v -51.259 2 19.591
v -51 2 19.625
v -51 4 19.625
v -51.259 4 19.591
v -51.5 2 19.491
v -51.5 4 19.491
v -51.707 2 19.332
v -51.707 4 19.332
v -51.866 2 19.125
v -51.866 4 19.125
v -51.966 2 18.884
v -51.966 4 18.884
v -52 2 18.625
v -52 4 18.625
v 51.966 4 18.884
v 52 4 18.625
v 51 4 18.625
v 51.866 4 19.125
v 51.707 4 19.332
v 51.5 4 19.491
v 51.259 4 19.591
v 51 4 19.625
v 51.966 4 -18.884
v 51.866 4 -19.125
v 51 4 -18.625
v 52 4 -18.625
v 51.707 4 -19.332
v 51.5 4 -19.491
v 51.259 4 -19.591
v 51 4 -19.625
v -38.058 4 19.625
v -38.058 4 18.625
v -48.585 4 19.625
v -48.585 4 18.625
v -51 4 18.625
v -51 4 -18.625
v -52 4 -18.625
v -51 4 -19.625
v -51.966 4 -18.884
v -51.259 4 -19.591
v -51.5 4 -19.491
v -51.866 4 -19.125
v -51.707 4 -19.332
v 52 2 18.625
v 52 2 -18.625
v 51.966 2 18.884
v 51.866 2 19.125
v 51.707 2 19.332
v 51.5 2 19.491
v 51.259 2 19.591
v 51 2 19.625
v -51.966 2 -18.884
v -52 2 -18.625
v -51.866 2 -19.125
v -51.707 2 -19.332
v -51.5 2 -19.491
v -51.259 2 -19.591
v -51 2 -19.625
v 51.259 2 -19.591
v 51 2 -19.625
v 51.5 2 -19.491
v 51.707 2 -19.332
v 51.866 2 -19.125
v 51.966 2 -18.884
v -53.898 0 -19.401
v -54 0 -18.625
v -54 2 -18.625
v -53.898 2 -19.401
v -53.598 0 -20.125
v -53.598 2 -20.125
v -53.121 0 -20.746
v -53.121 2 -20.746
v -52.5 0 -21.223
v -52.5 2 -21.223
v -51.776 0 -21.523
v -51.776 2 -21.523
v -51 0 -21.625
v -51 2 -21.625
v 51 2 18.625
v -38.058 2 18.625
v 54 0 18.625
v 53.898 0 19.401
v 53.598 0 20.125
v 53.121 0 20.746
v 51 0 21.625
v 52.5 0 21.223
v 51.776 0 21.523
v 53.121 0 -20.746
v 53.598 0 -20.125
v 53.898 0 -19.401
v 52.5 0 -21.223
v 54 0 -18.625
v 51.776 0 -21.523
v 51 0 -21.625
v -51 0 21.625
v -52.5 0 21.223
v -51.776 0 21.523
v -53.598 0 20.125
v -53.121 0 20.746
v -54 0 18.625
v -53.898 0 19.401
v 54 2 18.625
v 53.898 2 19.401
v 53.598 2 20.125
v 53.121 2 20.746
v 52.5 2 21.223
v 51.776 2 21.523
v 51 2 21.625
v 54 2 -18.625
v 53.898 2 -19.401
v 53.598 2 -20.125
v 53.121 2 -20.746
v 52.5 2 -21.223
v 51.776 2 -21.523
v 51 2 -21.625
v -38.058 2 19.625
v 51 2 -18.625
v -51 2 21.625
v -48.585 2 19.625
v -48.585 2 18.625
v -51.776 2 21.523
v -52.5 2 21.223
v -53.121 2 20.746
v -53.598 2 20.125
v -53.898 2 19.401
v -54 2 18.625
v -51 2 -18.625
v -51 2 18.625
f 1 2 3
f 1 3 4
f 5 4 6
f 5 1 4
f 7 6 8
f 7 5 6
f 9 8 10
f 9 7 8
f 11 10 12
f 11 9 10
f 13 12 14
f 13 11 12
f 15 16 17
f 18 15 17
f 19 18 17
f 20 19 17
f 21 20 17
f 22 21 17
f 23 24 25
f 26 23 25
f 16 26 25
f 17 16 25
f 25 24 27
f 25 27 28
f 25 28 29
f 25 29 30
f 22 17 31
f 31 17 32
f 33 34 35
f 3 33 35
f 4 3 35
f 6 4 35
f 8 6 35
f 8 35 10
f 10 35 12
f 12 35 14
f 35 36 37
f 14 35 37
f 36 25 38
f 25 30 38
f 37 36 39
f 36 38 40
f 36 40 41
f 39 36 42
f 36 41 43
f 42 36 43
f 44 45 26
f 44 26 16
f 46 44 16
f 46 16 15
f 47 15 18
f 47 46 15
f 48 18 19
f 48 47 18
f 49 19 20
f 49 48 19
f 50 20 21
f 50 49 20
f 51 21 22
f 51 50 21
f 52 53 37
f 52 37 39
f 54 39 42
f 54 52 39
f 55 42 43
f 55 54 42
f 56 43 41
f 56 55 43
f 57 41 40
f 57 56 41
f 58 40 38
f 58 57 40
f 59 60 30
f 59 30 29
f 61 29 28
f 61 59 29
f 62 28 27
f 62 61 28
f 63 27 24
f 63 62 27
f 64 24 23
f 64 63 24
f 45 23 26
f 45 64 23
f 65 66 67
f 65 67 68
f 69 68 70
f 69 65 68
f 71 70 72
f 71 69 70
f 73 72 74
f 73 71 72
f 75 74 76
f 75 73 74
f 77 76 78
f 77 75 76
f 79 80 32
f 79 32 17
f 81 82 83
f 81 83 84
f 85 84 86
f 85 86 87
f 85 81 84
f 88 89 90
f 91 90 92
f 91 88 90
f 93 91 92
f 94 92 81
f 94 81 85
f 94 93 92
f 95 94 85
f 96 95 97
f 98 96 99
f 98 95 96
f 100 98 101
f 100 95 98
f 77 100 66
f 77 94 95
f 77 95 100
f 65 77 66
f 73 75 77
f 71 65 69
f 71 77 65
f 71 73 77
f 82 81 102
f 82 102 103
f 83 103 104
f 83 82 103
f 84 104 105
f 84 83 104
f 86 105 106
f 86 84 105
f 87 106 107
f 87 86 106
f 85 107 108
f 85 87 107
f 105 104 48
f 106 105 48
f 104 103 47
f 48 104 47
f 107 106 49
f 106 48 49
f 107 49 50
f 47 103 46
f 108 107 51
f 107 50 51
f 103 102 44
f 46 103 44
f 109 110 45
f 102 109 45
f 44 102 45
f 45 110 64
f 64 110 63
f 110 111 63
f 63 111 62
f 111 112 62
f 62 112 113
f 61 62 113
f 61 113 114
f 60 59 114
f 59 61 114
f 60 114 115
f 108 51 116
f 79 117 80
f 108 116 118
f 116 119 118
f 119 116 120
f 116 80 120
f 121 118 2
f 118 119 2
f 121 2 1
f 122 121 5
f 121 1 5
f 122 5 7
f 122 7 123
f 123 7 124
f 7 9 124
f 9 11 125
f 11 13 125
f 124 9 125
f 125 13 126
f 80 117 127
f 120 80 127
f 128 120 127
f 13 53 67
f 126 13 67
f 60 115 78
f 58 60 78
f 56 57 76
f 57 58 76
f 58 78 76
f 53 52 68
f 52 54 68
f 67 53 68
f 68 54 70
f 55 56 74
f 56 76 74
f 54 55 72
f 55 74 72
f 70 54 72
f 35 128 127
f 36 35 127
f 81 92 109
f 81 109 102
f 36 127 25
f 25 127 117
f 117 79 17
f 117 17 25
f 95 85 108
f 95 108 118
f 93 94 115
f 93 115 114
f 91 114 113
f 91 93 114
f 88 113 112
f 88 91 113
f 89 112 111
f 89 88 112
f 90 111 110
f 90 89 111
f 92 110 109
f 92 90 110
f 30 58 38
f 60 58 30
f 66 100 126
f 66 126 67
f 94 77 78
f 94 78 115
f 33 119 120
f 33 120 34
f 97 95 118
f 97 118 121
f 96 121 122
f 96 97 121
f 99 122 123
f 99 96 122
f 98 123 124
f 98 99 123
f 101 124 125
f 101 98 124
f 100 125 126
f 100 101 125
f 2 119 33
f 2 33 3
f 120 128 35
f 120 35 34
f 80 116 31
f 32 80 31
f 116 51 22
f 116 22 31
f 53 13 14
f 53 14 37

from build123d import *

# Parameters (mm, degrees)
BOSS_EXTRUDE1_DEPTH = 2
SKETCH2_W           = 102
SKETCH2_H           = 37.25
BOSS_EXTRUDE2_DEPTH = 2
SKETCH3_W           = 10.5265
SKETCH3_H           = 3.907167626
CUT_EXTRUDE1_DEPTH  = 2


with BuildPart() as part:
    # Sketch1 → Boss-Extrude1 (new body)
    with BuildSketch(Plane(origin=(0, 0, 0), x_dir=(1, 0, 0), z_dir=(0, 1, 0))):
        with BuildLine():
            Line((51, -21.625), (-51, -21.625))
            ThreePointArc((-51, -21.625), (-53.121320344, -20.746320344), (-54, -18.625))
            Line((-54, -18.625), (-54, 18.625))
            ThreePointArc((-54, 18.625), (-53.121320344, 20.746320344), (-51, 21.625))
            Line((-51, 21.625), (51, 21.625))
            ThreePointArc((51, 21.625), (53.121320344, 20.746320344), (54, 18.625))
            Line((54, 18.625), (54, -18.625))
            ThreePointArc((54, -18.625), (53.121320344, -20.746320344), (51, -21.625))
        make_face()
    extrude(amount=BOSS_EXTRUDE1_DEPTH)

    # Sketch2 → Boss-Extrude2 (add)
    with BuildSketch(Plane(origin=(0, 2, 0), x_dir=(1, 0, 0), z_dir=(0, 1, 0))):
        with BuildLine():
            Line((51, -19.625), (-51, -19.625))
            ThreePointArc((-51, -19.625), (-51.707106781, -19.332106781), (-52, -18.625))
            Line((-52, -18.625), (-52, 18.625))
            ThreePointArc((-52, 18.625), (-51.707106781, 19.332106781), (-51, 19.625))
            Line((-51, 19.625), (51, 19.625))
            ThreePointArc((51, 19.625), (51.707106781, 19.332106781), (52, 18.625))
            Line((52, 18.625), (52, -18.625))
            ThreePointArc((52, -18.625), (51.707106781, -19.332106781), (51, -19.625))
        make_face()
        Rectangle(SKETCH2_W, SKETCH2_H, mode=Mode.SUBTRACT)
    extrude(amount=BOSS_EXTRUDE2_DEPTH)

    # Sketch3 → Cut-Extrude1 (cut)
    with BuildSketch(Plane.XY.offset(19.625)):
        with Locations((-43.32145, 3.953583813)):
            Rectangle(SKETCH3_W, SKETCH3_H)
    extrude(amount=-CUT_EXTRUDE1_DEPTH, mode=Mode.SUBTRACT)


solid = part.part
